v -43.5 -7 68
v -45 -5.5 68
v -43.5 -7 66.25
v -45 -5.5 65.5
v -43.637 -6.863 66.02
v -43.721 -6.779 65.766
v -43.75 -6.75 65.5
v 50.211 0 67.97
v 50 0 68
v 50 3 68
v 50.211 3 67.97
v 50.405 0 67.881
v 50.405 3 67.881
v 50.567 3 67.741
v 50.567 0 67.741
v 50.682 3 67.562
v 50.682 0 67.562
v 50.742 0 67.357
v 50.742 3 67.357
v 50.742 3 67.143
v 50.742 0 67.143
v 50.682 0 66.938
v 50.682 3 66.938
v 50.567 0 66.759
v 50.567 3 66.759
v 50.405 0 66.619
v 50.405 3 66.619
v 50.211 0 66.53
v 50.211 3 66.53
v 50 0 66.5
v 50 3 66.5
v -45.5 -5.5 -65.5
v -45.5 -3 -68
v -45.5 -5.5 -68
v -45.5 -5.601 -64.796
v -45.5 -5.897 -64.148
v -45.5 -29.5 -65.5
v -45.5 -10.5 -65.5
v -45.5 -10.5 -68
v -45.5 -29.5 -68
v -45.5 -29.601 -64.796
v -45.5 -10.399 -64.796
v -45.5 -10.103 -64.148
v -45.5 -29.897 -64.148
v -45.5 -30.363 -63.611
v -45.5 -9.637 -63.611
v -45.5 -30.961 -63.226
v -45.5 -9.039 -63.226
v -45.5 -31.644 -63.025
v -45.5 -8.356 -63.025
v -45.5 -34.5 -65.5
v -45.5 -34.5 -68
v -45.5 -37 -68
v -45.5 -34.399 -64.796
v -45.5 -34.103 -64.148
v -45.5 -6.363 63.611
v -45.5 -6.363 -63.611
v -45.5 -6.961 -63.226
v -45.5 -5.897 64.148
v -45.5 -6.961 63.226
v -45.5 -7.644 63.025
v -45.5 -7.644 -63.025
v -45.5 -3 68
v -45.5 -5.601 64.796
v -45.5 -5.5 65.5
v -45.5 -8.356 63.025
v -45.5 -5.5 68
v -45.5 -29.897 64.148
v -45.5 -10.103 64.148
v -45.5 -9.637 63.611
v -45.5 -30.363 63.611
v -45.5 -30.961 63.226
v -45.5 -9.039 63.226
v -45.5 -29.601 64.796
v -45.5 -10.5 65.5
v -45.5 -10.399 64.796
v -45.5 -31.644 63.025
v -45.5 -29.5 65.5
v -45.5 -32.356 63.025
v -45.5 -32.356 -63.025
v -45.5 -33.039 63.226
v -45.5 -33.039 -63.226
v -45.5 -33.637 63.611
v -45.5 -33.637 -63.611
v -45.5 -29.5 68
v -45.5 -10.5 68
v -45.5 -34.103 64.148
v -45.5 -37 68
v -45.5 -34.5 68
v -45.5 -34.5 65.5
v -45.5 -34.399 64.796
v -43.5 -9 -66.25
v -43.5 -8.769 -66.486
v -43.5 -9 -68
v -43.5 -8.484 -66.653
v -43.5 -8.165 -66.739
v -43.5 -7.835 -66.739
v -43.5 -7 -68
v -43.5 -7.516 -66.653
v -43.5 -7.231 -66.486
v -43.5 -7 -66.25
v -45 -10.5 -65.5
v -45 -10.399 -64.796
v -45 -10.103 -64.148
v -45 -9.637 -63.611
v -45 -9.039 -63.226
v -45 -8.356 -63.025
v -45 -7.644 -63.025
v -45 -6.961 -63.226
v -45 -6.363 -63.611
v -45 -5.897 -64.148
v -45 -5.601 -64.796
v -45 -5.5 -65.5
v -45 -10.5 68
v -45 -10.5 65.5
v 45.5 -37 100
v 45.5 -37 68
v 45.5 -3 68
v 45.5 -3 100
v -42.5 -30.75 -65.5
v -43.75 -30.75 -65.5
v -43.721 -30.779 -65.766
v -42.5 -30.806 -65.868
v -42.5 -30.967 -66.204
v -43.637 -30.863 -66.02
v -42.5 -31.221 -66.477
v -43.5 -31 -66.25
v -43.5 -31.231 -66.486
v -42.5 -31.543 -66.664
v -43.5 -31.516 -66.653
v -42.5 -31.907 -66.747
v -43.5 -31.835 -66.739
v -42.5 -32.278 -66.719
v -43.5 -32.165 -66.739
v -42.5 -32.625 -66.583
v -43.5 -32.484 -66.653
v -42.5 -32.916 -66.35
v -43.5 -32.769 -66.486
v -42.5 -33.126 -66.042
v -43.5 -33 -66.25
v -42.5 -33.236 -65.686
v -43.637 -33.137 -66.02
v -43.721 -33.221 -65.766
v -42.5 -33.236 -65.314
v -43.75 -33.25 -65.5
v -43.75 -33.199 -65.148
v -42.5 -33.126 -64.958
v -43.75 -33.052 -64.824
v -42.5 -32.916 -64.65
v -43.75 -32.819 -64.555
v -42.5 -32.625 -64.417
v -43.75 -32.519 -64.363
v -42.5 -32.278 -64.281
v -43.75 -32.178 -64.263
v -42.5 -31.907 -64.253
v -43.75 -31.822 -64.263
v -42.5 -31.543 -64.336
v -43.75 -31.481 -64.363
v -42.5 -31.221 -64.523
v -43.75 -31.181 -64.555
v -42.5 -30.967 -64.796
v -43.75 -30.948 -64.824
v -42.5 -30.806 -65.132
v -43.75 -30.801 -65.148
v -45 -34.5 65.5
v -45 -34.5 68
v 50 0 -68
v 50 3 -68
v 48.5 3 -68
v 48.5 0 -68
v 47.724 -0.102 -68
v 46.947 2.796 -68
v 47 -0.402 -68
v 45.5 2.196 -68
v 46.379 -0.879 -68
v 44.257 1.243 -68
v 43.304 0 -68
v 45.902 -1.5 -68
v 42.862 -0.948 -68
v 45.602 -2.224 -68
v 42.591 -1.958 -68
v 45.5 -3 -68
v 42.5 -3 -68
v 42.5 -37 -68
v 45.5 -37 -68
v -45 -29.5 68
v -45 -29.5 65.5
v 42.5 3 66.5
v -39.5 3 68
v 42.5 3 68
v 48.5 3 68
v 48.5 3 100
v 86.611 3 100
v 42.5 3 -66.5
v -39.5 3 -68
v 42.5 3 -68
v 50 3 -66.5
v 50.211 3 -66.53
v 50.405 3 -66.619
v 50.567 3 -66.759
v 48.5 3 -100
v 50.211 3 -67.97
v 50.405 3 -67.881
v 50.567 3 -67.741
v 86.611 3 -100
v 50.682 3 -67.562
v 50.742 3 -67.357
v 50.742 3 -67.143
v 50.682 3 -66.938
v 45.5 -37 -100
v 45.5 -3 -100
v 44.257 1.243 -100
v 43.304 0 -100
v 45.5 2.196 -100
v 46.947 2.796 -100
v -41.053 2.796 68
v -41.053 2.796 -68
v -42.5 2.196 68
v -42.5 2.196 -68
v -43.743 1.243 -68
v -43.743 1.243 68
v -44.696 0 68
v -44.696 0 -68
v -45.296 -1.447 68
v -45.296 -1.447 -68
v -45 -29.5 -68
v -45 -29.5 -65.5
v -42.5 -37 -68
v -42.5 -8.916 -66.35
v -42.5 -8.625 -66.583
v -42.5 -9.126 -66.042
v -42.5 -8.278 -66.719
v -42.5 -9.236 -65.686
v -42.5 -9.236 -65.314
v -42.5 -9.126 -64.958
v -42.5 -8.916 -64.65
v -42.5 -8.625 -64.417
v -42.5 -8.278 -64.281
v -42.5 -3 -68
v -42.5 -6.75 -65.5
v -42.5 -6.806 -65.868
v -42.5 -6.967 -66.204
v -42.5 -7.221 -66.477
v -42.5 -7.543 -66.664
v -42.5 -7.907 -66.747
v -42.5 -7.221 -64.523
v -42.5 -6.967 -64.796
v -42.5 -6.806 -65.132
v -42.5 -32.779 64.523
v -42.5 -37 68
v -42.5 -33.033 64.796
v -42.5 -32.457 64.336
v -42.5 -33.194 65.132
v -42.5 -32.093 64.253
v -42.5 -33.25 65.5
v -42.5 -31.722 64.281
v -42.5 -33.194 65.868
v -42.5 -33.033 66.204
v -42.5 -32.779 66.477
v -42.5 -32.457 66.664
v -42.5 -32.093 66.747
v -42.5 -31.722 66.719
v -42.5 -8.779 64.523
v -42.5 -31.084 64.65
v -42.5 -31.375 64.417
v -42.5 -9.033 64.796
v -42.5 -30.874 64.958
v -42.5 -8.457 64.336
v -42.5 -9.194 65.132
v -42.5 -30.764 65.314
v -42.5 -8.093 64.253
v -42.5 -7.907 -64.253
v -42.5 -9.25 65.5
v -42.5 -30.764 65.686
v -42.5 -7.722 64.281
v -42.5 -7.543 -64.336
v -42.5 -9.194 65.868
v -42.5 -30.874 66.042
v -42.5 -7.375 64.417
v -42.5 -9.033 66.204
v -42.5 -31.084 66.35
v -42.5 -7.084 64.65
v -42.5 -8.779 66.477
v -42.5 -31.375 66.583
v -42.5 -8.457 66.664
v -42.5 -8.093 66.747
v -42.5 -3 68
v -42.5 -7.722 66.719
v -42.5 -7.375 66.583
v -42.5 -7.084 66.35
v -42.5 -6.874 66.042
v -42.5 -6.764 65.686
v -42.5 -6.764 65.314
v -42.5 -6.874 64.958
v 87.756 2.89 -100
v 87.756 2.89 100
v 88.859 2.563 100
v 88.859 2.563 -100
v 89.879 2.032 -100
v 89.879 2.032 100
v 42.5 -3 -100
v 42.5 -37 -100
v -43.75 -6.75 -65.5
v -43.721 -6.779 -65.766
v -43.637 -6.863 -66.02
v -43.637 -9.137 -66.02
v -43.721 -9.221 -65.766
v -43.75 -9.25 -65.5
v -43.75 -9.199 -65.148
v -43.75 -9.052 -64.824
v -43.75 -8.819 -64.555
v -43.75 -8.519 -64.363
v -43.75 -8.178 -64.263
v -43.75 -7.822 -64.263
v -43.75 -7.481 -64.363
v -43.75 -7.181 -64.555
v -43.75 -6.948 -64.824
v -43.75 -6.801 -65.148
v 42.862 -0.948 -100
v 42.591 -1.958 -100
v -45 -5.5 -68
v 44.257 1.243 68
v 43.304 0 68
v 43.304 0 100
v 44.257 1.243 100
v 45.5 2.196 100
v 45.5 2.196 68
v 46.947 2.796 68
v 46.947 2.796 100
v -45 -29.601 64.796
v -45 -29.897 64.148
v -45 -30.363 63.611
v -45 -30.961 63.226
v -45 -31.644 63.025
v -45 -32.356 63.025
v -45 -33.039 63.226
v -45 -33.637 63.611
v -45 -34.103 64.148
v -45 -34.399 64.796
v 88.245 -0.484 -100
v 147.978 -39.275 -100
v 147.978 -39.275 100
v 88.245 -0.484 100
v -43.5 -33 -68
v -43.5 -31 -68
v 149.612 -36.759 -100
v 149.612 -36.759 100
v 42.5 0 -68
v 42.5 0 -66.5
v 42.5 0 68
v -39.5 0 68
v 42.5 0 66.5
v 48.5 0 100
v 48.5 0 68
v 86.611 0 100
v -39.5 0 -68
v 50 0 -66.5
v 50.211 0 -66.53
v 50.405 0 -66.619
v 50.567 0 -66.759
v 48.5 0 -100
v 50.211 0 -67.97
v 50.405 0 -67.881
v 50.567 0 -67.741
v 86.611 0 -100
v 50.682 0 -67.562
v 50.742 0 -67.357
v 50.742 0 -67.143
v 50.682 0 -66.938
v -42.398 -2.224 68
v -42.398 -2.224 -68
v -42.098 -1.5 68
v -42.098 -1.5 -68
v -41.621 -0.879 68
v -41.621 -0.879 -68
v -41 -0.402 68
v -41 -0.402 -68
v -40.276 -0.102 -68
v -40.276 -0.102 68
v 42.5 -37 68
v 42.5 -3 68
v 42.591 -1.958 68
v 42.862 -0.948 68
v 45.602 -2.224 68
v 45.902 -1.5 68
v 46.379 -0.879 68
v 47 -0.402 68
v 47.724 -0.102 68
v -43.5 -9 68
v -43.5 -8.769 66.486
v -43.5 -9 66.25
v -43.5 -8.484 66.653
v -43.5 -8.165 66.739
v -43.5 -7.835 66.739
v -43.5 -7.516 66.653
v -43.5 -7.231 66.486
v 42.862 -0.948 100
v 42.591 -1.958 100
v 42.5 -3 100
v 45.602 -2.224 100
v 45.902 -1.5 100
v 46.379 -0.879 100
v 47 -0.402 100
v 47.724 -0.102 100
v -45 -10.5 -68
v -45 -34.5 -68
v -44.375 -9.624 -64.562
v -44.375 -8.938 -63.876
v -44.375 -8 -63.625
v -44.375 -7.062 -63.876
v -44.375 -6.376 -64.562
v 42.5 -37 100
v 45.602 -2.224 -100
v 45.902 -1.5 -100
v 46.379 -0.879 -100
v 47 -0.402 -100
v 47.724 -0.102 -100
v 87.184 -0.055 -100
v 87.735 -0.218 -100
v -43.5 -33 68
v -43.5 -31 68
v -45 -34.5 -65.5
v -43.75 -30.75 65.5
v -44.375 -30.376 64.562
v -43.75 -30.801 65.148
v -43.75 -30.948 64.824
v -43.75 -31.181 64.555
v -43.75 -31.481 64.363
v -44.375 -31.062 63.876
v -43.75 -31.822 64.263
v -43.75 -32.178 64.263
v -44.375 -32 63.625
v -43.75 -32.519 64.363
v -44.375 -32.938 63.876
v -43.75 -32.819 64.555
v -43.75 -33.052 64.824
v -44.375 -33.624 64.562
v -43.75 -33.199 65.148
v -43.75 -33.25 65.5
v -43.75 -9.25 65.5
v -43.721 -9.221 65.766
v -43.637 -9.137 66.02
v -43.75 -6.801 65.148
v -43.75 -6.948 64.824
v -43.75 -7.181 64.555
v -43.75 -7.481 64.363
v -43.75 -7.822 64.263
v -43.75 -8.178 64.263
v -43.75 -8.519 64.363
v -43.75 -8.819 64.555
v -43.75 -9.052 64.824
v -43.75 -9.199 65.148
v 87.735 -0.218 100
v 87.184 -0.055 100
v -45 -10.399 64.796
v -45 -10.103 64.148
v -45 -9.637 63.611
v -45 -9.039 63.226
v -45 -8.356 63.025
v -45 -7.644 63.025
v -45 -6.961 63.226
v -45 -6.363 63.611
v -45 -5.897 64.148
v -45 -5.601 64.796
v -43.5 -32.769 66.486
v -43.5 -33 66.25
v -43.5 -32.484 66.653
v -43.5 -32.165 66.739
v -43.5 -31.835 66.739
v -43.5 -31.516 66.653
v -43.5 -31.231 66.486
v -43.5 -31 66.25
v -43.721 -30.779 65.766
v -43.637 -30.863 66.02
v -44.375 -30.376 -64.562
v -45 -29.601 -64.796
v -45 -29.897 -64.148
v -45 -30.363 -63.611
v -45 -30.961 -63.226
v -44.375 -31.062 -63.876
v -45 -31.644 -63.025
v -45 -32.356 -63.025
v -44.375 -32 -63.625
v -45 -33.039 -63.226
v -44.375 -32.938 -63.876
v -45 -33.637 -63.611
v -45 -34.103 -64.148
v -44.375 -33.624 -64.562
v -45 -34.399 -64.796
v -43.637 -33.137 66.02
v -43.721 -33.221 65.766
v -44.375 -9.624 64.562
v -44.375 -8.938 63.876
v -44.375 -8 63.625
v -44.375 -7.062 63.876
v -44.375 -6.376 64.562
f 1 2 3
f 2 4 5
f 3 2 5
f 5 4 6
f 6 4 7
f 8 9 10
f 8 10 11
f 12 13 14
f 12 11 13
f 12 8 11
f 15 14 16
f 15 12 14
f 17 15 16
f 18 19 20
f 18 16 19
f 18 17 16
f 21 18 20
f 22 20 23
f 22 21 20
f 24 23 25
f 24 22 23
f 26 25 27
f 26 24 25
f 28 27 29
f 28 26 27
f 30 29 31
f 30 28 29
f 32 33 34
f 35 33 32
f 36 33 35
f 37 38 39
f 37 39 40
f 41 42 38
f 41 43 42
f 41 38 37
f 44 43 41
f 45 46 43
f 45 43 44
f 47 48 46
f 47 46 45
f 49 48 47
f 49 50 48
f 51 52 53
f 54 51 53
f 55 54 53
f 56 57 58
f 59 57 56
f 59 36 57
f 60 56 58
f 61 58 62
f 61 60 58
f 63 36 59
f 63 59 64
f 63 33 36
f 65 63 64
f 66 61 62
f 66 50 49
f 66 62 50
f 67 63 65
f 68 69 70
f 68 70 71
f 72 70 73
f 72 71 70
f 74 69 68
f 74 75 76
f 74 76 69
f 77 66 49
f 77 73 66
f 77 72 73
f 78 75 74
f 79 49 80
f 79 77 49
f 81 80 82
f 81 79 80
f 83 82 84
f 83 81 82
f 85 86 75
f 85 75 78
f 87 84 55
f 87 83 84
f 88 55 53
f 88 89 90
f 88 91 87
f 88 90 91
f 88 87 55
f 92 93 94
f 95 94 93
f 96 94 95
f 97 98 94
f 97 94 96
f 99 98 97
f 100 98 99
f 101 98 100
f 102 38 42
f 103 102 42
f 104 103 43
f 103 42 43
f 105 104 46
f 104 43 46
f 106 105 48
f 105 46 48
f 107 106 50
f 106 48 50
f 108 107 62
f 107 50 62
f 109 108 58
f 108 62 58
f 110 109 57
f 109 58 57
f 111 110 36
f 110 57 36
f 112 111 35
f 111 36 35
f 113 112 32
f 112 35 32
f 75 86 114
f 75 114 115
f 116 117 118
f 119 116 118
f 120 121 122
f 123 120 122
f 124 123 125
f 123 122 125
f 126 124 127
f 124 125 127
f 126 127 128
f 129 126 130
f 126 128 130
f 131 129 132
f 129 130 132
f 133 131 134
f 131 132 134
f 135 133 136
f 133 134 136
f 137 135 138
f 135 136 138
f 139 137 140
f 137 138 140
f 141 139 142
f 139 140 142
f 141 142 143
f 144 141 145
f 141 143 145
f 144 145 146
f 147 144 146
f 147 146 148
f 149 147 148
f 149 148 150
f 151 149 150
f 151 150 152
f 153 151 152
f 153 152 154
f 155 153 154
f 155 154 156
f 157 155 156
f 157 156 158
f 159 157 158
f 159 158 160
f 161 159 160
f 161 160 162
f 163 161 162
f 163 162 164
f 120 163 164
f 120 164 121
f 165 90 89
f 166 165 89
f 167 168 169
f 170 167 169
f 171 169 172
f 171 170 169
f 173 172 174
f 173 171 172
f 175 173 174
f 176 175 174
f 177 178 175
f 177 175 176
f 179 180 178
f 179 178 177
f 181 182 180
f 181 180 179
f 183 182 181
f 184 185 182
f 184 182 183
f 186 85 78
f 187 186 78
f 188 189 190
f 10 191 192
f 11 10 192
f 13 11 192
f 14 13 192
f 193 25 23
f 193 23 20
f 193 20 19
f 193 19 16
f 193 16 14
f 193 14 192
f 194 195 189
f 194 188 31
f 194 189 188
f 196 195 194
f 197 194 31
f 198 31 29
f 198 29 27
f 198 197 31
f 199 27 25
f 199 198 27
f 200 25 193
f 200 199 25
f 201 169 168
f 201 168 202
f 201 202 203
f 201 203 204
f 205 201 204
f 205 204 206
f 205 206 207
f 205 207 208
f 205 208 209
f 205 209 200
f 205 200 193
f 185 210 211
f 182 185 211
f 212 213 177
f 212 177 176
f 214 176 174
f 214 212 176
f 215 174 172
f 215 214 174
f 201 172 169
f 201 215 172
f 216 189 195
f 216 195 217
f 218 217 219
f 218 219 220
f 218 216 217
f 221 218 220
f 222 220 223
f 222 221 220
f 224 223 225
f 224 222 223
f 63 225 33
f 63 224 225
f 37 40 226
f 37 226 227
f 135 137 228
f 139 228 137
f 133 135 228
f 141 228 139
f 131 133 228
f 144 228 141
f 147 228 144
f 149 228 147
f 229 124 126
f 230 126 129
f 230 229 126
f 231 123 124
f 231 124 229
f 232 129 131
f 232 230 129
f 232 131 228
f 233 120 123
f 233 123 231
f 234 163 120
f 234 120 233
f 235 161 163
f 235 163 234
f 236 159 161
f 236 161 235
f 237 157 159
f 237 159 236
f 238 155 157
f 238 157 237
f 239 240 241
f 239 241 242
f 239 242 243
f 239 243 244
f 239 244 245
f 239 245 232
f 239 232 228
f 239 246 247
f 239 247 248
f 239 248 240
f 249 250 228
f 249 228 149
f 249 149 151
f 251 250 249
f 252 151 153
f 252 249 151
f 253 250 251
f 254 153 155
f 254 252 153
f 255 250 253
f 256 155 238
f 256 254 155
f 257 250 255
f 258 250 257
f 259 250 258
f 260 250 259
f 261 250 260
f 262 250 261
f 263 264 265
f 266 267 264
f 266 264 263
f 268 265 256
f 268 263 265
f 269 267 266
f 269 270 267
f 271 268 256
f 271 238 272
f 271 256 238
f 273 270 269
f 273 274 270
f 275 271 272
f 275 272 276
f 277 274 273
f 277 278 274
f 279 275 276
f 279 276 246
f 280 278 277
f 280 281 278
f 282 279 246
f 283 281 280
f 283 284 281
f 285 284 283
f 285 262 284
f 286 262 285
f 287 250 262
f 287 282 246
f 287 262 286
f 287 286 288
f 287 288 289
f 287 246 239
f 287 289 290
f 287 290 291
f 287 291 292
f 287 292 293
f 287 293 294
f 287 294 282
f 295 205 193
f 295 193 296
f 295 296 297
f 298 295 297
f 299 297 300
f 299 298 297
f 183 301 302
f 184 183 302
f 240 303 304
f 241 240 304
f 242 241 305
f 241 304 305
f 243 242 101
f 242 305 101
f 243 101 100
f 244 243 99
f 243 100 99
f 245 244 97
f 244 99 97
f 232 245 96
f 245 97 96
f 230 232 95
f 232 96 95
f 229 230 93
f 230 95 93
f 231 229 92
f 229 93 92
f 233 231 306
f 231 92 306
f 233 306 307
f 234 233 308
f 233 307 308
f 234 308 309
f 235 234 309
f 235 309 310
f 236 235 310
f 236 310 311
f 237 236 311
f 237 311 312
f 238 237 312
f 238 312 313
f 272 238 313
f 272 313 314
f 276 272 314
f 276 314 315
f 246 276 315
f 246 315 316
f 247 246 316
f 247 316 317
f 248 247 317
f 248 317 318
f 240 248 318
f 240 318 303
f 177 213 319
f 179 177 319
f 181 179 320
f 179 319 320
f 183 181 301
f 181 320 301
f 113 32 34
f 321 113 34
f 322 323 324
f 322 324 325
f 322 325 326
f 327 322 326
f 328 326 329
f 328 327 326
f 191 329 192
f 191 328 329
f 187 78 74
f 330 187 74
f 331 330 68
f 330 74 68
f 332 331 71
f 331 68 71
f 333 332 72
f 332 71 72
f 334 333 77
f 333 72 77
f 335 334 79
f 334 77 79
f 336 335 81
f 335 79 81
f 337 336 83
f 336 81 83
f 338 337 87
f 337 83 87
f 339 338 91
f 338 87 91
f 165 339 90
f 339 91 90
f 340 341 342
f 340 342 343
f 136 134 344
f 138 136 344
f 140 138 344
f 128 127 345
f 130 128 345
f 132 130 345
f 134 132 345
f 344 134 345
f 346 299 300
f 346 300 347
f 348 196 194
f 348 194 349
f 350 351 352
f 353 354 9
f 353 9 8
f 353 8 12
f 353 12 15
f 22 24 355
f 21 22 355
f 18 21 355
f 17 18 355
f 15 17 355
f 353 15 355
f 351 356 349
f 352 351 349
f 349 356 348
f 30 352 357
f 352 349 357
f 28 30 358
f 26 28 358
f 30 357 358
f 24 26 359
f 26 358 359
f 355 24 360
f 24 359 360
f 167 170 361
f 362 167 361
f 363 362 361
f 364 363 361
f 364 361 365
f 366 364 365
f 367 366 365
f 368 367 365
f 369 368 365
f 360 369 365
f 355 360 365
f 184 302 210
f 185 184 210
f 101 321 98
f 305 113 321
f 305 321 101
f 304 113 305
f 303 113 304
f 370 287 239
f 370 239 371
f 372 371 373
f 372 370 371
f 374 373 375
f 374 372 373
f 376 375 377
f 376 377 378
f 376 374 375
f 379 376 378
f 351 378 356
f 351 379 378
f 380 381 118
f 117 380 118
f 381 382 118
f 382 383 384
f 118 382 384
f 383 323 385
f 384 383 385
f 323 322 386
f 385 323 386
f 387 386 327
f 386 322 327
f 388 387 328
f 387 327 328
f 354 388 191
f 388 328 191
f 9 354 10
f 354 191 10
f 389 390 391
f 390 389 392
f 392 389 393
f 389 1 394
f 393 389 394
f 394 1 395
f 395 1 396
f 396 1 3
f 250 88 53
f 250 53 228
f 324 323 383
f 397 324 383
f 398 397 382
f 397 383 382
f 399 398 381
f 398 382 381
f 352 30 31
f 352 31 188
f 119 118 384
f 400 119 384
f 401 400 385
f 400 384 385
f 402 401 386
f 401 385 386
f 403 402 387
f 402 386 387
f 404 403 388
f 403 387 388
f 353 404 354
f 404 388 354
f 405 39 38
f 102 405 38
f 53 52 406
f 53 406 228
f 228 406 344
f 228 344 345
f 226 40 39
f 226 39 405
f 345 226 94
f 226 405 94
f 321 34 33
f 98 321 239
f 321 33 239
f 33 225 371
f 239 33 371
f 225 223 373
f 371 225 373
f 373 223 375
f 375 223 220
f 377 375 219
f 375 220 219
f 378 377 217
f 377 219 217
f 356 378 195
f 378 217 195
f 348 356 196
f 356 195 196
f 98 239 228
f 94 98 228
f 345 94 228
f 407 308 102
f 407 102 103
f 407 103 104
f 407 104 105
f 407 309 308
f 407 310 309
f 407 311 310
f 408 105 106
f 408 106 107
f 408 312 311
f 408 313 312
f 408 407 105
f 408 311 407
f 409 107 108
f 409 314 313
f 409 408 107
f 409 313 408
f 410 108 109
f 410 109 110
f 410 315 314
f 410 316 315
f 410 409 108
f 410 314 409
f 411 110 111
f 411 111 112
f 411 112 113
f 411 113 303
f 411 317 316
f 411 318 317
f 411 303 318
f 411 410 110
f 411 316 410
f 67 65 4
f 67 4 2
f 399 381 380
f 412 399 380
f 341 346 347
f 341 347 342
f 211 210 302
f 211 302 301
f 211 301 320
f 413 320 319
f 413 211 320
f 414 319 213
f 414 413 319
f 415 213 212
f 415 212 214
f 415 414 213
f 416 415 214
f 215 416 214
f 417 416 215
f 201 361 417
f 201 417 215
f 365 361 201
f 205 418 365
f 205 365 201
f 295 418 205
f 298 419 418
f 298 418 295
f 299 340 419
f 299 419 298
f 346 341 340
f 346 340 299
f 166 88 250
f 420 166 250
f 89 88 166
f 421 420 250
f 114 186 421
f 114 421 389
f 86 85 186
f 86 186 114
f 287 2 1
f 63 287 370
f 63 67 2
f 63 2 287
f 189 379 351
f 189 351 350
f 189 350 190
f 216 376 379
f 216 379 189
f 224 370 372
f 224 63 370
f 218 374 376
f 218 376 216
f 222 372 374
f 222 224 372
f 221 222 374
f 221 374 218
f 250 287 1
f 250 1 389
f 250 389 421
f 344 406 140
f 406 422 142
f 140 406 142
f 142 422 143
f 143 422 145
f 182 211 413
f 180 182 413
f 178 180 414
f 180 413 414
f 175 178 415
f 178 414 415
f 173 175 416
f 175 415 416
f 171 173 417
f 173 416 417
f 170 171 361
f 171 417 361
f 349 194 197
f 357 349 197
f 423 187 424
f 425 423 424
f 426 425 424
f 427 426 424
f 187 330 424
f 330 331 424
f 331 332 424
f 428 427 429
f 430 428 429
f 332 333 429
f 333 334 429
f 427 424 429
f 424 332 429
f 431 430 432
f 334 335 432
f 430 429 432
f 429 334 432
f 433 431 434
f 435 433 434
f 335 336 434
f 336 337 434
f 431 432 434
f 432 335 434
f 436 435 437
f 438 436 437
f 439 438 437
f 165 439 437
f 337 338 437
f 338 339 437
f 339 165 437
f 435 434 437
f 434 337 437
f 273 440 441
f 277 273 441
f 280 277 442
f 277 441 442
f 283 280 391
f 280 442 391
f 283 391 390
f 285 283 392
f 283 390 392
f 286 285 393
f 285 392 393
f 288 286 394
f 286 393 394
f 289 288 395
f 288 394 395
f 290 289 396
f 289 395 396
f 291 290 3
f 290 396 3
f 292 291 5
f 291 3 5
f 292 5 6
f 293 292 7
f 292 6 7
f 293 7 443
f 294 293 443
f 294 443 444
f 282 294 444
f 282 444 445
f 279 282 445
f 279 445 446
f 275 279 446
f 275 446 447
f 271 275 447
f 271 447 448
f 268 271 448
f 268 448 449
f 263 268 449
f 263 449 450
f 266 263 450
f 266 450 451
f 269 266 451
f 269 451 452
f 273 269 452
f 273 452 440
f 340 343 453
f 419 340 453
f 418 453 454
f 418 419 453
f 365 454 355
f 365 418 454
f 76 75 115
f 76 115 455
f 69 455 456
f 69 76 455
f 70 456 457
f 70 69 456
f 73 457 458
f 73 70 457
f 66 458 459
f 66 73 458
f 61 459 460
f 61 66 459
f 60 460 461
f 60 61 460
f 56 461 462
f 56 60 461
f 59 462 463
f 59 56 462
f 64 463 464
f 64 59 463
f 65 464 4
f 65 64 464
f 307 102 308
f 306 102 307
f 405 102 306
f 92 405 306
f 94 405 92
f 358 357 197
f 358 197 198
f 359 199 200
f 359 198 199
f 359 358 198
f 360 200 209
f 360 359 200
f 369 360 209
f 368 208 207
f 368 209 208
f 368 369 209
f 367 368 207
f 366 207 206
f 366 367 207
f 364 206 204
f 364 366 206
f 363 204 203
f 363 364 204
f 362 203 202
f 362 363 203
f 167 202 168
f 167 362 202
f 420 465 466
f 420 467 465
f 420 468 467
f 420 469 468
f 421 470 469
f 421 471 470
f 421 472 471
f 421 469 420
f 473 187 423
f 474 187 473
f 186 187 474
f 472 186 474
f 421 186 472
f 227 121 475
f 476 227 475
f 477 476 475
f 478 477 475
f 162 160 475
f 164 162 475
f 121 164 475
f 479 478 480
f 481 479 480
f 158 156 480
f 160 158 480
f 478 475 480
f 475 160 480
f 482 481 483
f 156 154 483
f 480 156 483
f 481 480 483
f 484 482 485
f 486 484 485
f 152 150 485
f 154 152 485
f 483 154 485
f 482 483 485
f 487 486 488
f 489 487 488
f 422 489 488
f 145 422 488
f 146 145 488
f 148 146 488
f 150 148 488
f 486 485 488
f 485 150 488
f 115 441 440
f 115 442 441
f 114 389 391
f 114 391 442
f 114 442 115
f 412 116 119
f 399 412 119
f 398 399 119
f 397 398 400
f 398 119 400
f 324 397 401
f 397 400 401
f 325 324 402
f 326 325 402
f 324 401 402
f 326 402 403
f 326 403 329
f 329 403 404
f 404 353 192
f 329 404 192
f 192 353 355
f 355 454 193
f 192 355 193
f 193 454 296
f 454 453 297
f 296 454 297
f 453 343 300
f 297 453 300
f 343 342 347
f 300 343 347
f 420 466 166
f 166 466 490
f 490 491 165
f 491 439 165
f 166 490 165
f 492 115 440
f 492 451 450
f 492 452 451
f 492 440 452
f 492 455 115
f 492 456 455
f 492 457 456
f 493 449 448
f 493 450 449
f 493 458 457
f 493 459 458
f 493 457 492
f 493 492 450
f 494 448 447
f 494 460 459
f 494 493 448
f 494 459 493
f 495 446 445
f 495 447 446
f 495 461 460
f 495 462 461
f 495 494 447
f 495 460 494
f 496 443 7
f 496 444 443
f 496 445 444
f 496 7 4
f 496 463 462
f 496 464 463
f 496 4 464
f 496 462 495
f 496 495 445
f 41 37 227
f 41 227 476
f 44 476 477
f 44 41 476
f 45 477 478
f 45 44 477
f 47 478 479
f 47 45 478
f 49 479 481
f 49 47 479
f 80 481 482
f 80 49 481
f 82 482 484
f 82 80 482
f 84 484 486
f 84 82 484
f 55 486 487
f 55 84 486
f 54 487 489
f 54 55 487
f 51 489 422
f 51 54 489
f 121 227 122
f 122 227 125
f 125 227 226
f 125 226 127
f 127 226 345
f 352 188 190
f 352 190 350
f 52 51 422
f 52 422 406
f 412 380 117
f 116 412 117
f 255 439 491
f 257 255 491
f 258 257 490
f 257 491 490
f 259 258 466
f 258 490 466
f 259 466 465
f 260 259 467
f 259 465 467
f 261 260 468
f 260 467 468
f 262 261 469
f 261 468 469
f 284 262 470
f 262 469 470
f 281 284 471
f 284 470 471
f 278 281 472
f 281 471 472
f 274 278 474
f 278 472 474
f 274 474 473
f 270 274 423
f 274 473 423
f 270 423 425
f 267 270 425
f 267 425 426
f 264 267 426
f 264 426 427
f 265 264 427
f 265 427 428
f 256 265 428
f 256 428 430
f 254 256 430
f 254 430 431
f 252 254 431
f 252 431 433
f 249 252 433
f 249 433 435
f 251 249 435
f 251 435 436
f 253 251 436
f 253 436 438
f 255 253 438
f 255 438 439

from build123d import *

# Parameters (mm, degrees)
SALIENTE_EXTRUIR1_DEPTH          = 3
BRIDA_DE_ARISTA1_STRIP_W         = 18
BRIDA_DE_ARISTA1_STRIP_H         = 3
BRIDA_DE_ARISTA1_STRIP_CUT_DEPTH = 136
BRIDA_DE_ARISTA1_DEPTH           = 136
CROQUIS5_R                       = 1.25
CORTAR_EXTRUIR1_DEPTH            = 3
CORTAR_EXTRUIR2_DEPTH            = 2
CHAFL_N1_SIZE                    = 1.5
BRIDA_START                      = -100
BRIDA_DE_ARISTA2_DEPTH           = 33.5
BRIDA_START_2                    = 66.5
BRIDA_DE_ARISTA2_2_DEPTH         = 33.5
BRIDA_DE_ARISTA2_3_DEPTH         = 32
BRIDA_START_3                    = 68
BRIDA_DE_ARISTA2_4_DEPTH         = 32
BRIDA_START_4                    = -3
BRIDA_DE_ARISTA2_5_DEPTH         = 7
BRIDA_DE_ARISTA3_STRIP_CUT_DEPTH = 200
BRIDA_DE_ARISTA3_DEPTH           = 200


with BuildPart() as part:
    # Croquis1 → Saliente-Extruir1 (new body)
    with BuildSketch(Plane(origin=(0, 0, 0), x_dir=(1, 0, 0), z_dir=(0, 1, 0))):
        Polygon((-42.5, -68), (42.5, -68), (42.5, -100), (87.5, -100), (87.5, 100), (42.5, 100), (42.5, 68), (-42.5, 68), align=None)
    extrude(amount=SALIENTE_EXTRUIR1_DEPTH)

    # Brida de arista1: sheet metal written as solids
    # Brida de arista1 strip (on a plane across the edge) → Brida de arista1 strip cut (cut)
    with BuildSketch(Plane(origin=(-42.5, 0, 68), x_dir=(1, 0, 0), z_dir=(0, 0, -1))):
        with Locations((-6, -1.5)):
            Rectangle(BRIDA_DE_ARISTA1_STRIP_W, BRIDA_DE_ARISTA1_STRIP_H)
    extrude(amount=BRIDA_DE_ARISTA1_STRIP_CUT_DEPTH, mode=Mode.SUBTRACT)

    # Brida de arista1 section (on a plane across the edge) → Brida de arista1 (add)
    with BuildSketch(Plane(origin=(-42.5, 0, 68), x_dir=(1, 0, 0), z_dir=(0, 0, -1))):
        with BuildLine():
            Line((-3, 3), (-3, 37))
            Line((-3, 37), (0, 37))
            Line((0, 37), (0, 3))
            ThreePointArc((0, 3), (0.878679656, 0.878679656), (3, 0))
            Line((3, 0), (3, -3))
            ThreePointArc((3, -3), (-1.242640687, -1.242640687), (-3, 3))
        make_face()
    extrude(amount=BRIDA_DE_ARISTA1_DEPTH)

    # Croquis5 → Cortar-Extruir1 (cut)
    with BuildSketch(Plane.ZY.offset(45.5)):
        with Locations(Location((65.5, -32, 0), (0, 0, 270))):
            Circle(CROQUIS5_R)
        with Locations(Location((65.5, -8, 0), (0, 0, 270))):
            Circle(CROQUIS5_R)
        with Locations(Location((-65.5, -8, 0), (0, 0, 90))):
            Circle(CROQUIS5_R)
        with Locations(Location((-65.5, -32, 0), (0, 0, 90))):
            Circle(CROQUIS5_R)
    extrude(amount=-CORTAR_EXTRUIR1_DEPTH, mode=Mode.SUBTRACT)

    # Croquis6 → Cortar-Extruir2 (cut)
    with BuildSketch(Plane.ZY.offset(45.5)):
        with BuildLine():
            Line((65.5, -5.5), (68, -5.5))
            Line((68, -5.5), (68, -10.5))
            Line((68, -10.5), (65.5, -10.5))
            ThreePointArc((65.5, -10.5), (63, -8), (65.5, -5.5))
        make_face()
        with BuildLine():
            Line((68, -29.5), (65.5, -29.5))
            ThreePointArc((65.5, -29.5), (63, -32), (65.5, -34.5))
            Line((65.5, -34.5), (68, -34.5))
            Line((68, -34.5), (68, -29.5))
        make_face()
        with BuildLine():
            Line((-65.5, -34.5), (-68, -34.5))
            Line((-68, -34.5), (-68, -29.5))
            Line((-68, -29.5), (-65.5, -29.5))
            ThreePointArc((-65.5, -29.5), (-63, -32), (-65.5, -34.5))
        make_face()
        with BuildLine():
            Line((-68, -10.5), (-65.5, -10.5))
            ThreePointArc((-65.5, -10.5), (-63, -8), (-65.5, -5.5))
            Line((-65.5, -5.5), (-68, -5.5))
            Line((-68, -5.5), (-68, -10.5))
        make_face()
    extrude(amount=-CORTAR_EXTRUIR2_DEPTH, mode=Mode.SUBTRACT)

    # Chaflán1
    # the kernel refuses this chamfer: 1.5 mm, written as the material it adds along each edge
    with BuildSketch(Plane(origin=(-43.5, -5.5, 65.5), x_dir=(-1, 0, 0), z_dir=(0, 0, 1))) as chafl_n1_piece_1_section:
        Polygon((CHAFL_N1_SIZE, 0), (0, CHAFL_N1_SIZE), (0, 0), align=None)
    chafl_n1_piece_1 = extrude(amount=2.5, mode=Mode.PRIVATE)
    chafl_n1_piece_1 = chafl_n1_piece_1 - Plane(origin=(-43.5, -8, 65.5), x_dir=(0, -1, 0), z_dir=(-1, 0, 0)) * Cylinder(1.25, 12, mode=Mode.PRIVATE)
    add(chafl_n1_piece_1)
    with BuildSketch(Plane(origin=(-43.5, -10.5, 68), x_dir=(0, 1, 0), z_dir=(0, 0, -1))) as chafl_n1_piece_2_section:
        Polygon((CHAFL_N1_SIZE, 0), (0, -CHAFL_N1_SIZE), (0, 0), align=None)
    chafl_n1_piece_2 = extrude(amount=2.5, mode=Mode.PRIVATE)
    chafl_n1_piece_2 = chafl_n1_piece_2 - Plane(origin=(-43.5, -8, 65.5), x_dir=(0, -1, 0), z_dir=(-1, 0, 0)) * Cylinder(1.25, 12, mode=Mode.PRIVATE)
    add(chafl_n1_piece_2)
    with BuildSketch(Plane(origin=(-43.5, -29.5, 68), x_dir=(-1, 0, 0), z_dir=(0, 0, -1))) as chafl_n1_piece_3_section:
        Polygon((CHAFL_N1_SIZE, 0), (0, -CHAFL_N1_SIZE), (0, 0), align=None)
    chafl_n1_piece_3 = extrude(amount=2.5, mode=Mode.PRIVATE)
    chafl_n1_piece_3 = chafl_n1_piece_3 - Plane(origin=(-43.5, -32, 65.5), x_dir=(0, -1, 0), z_dir=(-1, 0, 0)) * Cylinder(1.25, 12, mode=Mode.PRIVATE)
    add(chafl_n1_piece_3)
    with BuildSketch(Plane(origin=(-43.5, -34.5, 65.5), x_dir=(0, 1, 0), z_dir=(0, 0, 1))) as chafl_n1_piece_4_section:
        Polygon((CHAFL_N1_SIZE, 0), (0, CHAFL_N1_SIZE), (0, 0), align=None)
    chafl_n1_piece_4 = extrude(amount=2.5, mode=Mode.PRIVATE)
    chafl_n1_piece_4 = chafl_n1_piece_4 - Plane(origin=(-43.5, -32, 65.5), x_dir=(0, -1, 0), z_dir=(-1, 0, 0)) * Cylinder(1.25, 12, mode=Mode.PRIVATE)
    add(chafl_n1_piece_4)
    with BuildSketch(Plane(origin=(-43.5, -34.5, -65.5), x_dir=(-1, 0, 0), z_dir=(0, 0, -1))) as chafl_n1_piece_5_section:
        Polygon((CHAFL_N1_SIZE, 0), (0, CHAFL_N1_SIZE), (0, 0), align=None)
    chafl_n1_piece_5 = extrude(amount=2.5, mode=Mode.PRIVATE)
    chafl_n1_piece_5 = chafl_n1_piece_5 - Plane(origin=(-43.5, -32, -65.5), x_dir=(0, 1, 0), z_dir=(-1, 0, 0)) * Cylinder(1.25, 12, mode=Mode.PRIVATE)
    add(chafl_n1_piece_5)
    with BuildSketch(Plane(origin=(-43.5, -29.5, -68), x_dir=(-1, 0, 0), z_dir=(0, 0, 1))) as chafl_n1_piece_6_section:
        Polygon((CHAFL_N1_SIZE, 0), (0, CHAFL_N1_SIZE), (0, 0), align=None)
    chafl_n1_piece_6 = extrude(amount=2.5, mode=Mode.PRIVATE)
    chafl_n1_piece_6 = chafl_n1_piece_6 - Plane(origin=(-43.5, -32, -65.5), x_dir=(0, 1, 0), z_dir=(-1, 0, 0)) * Cylinder(1.25, 12, mode=Mode.PRIVATE)
    add(chafl_n1_piece_6)
    with BuildSketch(Plane(origin=(-43.5, -10.5, -68), x_dir=(-1, 0, 0), z_dir=(0, 0, 1))) as chafl_n1_piece_7_section:
        Polygon((CHAFL_N1_SIZE, 0), (0, -CHAFL_N1_SIZE), (0, 0), align=None)
    chafl_n1_piece_7 = extrude(amount=2.5, mode=Mode.PRIVATE)
    chafl_n1_piece_7 = chafl_n1_piece_7 - Plane(origin=(-43.5, -8, -65.5), x_dir=(0, 1, 0), z_dir=(-1, 0, 0)) * Cylinder(1.25, 12, mode=Mode.PRIVATE)
    add(chafl_n1_piece_7)
    with BuildSketch(Plane(origin=(-43.5, -5.5, -65.5), x_dir=(-1, 0, 0), z_dir=(0, 0, -1))) as chafl_n1_piece_8_section:
        Polygon((CHAFL_N1_SIZE, 0), (0, -CHAFL_N1_SIZE), (0, 0), align=None)
    chafl_n1_piece_8 = extrude(amount=2.5, mode=Mode.PRIVATE)
    chafl_n1_piece_8 = chafl_n1_piece_8 - Plane(origin=(-43.5, -8, -65.5), x_dir=(0, 1, 0), z_dir=(-1, 0, 0)) * Cylinder(1.25, 12, mode=Mode.PRIVATE)
    add(chafl_n1_piece_8)
    with BuildSketch(Plane(origin=(-43.5, -8, -65.5), x_dir=(0, -1, 0), z_dir=(0, 0, -1))) as chafl_n1_piece_9_section:
        Polygon((2.5, CHAFL_N1_SIZE), (2.5 - CHAFL_N1_SIZE, 0), (2.5, 0), align=None)
    chafl_n1_piece_9 = revolve(axis=Axis((-43.5, -8, -65.5), (-1, 0, 0)), revolution_arc=180, mode=Mode.PRIVATE)
    chafl_n1_piece_9 = chafl_n1_piece_9 - Plane(origin=(-43.5, -8, -65.5), x_dir=(0, 1, 0), z_dir=(-1, 0, 0)) * Cylinder(1.25, 11, mode=Mode.PRIVATE)
    add(chafl_n1_piece_9)
    with BuildSketch(Plane(origin=(-43.5, -32, -65.5), x_dir=(0, 1, 0), z_dir=(0, 0, -1))) as chafl_n1_piece_10_section:
        Polygon((2.5, -CHAFL_N1_SIZE), (2.5 - CHAFL_N1_SIZE, 0), (2.5, 0), align=None)
    chafl_n1_piece_10 = revolve(axis=Axis((-43.5, -32, -65.5), (1, 0, 0)), revolution_arc=180, mode=Mode.PRIVATE)
    chafl_n1_piece_10 = chafl_n1_piece_10 - Plane(origin=(-43.5, -32, -65.5), x_dir=(0, 1, 0), z_dir=(-1, 0, 0)) * Cylinder(1.25, 11, mode=Mode.PRIVATE)
    add(chafl_n1_piece_10)
    with BuildSketch(Plane(origin=(-43.5, -32, 65.5), x_dir=(0, 1, 0), z_dir=(0, 0, 1))) as chafl_n1_piece_11_section:
        Polygon((2.5 - CHAFL_N1_SIZE, 0), (2.5, CHAFL_N1_SIZE), (2.5, 0), align=None)
    chafl_n1_piece_11 = revolve(axis=Axis((-43.5, -32, 65.5), (-1, 0, 0)), revolution_arc=180, mode=Mode.PRIVATE)
    chafl_n1_piece_11 = chafl_n1_piece_11 - Plane(origin=(-43.5, -32, 65.5), x_dir=(0, -1, 0), z_dir=(-1, 0, 0)) * Cylinder(1.25, 11, mode=Mode.PRIVATE)
    add(chafl_n1_piece_11)
    with BuildSketch(Plane(origin=(-43.5, -8, 65.5), x_dir=(0, -1, 0), z_dir=(0, 0, 1))) as chafl_n1_piece_12_section:
        Polygon((2.5 - CHAFL_N1_SIZE, 0), (2.5, -CHAFL_N1_SIZE), (2.5, 0), align=None)
    chafl_n1_piece_12 = revolve(axis=Axis((-43.5, -8, 65.5), (1, 0, 0)), revolution_arc=180, mode=Mode.PRIVATE)
    chafl_n1_piece_12 = chafl_n1_piece_12 - Plane(origin=(-43.5, -8, 65.5), x_dir=(0, -1, 0), z_dir=(-1, 0, 0)) * Cylinder(1.25, 11, mode=Mode.PRIVATE)
    add(chafl_n1_piece_12)

    # Brida de arista2: read off the stored shape, not the designer's step
    # Brida de arista2 outline → Brida de arista2 (cut)
    with BuildSketch(Plane.XY.offset(BRIDA_START)):
        with BuildLine():
            Line((42.5, 0), (43.303847577, 0))
            ThreePointArc((43.303847577, 0), (45.5, 2.196152423), (48.5, 3))
            Line((48.5, 3), (42.5, 3))
            Line((42.5, 3), (42.5, 0))
        make_face()
    extrude(amount=BRIDA_DE_ARISTA2_DEPTH, mode=Mode.SUBTRACT)

    # Brida de arista2 2 outline → Brida de arista2 2 (cut)
    with BuildSketch(Plane.XY.offset(BRIDA_START_2)):
        with BuildLine():
            Line((42.5, 0), (43.303847577, 0))
            ThreePointArc((43.303847577, 0), (45.5, 2.196152423), (48.5, 3))
            Line((48.5, 3), (42.5, 3))
            Line((42.5, 3), (42.5, 0))
        make_face()
    extrude(amount=BRIDA_DE_ARISTA2_2_DEPTH, mode=Mode.SUBTRACT)

    # Brida de arista2 3 outline → Brida de arista2 3 (add)
    with BuildSketch(Plane.XY.offset(BRIDA_START)):
        with BuildLine():
            Line((42.5, -37), (45.5, -37))
            Line((45.5, -37), (45.5, -3))
            ThreePointArc((45.5, -3), (46.378679656, -0.878679656), (48.5, 0))
            Line((48.5, 0), (43.303847577, 0))
            ThreePointArc((43.303847577, 0), (42.704445042, -1.447085729), (42.5, -3))
            Line((42.5, -3), (42.5, -37))
        make_face()
    extrude(amount=BRIDA_DE_ARISTA2_3_DEPTH)

    # Brida de arista2 4 outline → Brida de arista2 4 (add)
    with BuildSketch(Plane.XY.offset(BRIDA_START_3)):
        with BuildLine():
            Line((42.5, -37), (45.5, -37))
            Line((45.5, -37), (45.5, -3))
            ThreePointArc((45.5, -3), (46.378679656, -0.878679656), (48.5, 0))
            Line((48.5, 0), (43.303847577, 0))
            ThreePointArc((43.303847577, 0), (42.704445042, -1.447085729), (42.5, -3))
            Line((42.5, -3), (42.5, -37))
        make_face()
    extrude(amount=BRIDA_DE_ARISTA2_4_DEPTH)

    # Brida de arista2 5 outline → Brida de arista2 5 (cut)
    with BuildSketch(Plane(origin=(0, 0, 0), x_dir=(1, 0, 0), z_dir=(0, 1, 0)).offset(BRIDA_START_4)):
        with BuildLine():
            Line((50, -66.5), (43, -66.5))
            Line((43, -66.5), (43, -68))
            Line((43, -68), (50, -68))
            ThreePointArc((50, -68), (50.75, -67.25), (50, -66.5))
        make_face()
        with BuildLine():
            Line((43, 68), (43, 66.5))
            Line((43, 66.5), (50, 66.5))
            ThreePointArc((50, 66.5), (50.75, 67.25), (50, 68))
            Line((50, 68), (43, 68))
        make_face()
    extrude(amount=BRIDA_DE_ARISTA2_5_DEPTH, mode=Mode.SUBTRACT)

    # Brida de arista3: sheet metal written as solids
    # Brida de arista3 strip (on a plane across the edge) → Brida de arista3 strip cut (cut)
    with BuildSketch(Plane(origin=(87.5, 0, -100), x_dir=(-0.5446390350150233, -0.8386705679454266, 0), z_dir=(0, 0, 1))):
        Polygon((-11.835526038, 12.716876498), (-2.032023408, -2.379193725), (0.483988296, -0.74527662), (-9.319514334, 14.350793603), align=None)
    extrude(amount=BRIDA_DE_ARISTA3_STRIP_CUT_DEPTH, mode=Mode.SUBTRACT)

    # Brida de arista3 section (on a plane across the edge) → Brida de arista3 (add)
    with BuildSketch(Plane(origin=(87.5, 0, -100), x_dir=(-0.5446390350150233, -0.8386705679454266, 0), z_dir=(0, 0, 1))):
        with BuildLine():
            Line((-3, 0.888640485), (-3, 72.111359515))
            Line((-3, 72.111359515), (0, 72.111359515))
            Line((0, 72.111359515), (0, 0.888640485))
            ThreePointArc((0, 0.888640485), (0.123540795, 0.036594451), (0.483988296, -0.74527662))
            Line((0.483988296, -0.74527662), (-2.032023408, -2.379193725))
            ThreePointArc((-2.032023408, -2.379193725), (-2.752918409, -0.815451583), (-3, 0.888640485))
        make_face()
    extrude(amount=BRIDA_DE_ARISTA3_DEPTH)


solid = part.part
